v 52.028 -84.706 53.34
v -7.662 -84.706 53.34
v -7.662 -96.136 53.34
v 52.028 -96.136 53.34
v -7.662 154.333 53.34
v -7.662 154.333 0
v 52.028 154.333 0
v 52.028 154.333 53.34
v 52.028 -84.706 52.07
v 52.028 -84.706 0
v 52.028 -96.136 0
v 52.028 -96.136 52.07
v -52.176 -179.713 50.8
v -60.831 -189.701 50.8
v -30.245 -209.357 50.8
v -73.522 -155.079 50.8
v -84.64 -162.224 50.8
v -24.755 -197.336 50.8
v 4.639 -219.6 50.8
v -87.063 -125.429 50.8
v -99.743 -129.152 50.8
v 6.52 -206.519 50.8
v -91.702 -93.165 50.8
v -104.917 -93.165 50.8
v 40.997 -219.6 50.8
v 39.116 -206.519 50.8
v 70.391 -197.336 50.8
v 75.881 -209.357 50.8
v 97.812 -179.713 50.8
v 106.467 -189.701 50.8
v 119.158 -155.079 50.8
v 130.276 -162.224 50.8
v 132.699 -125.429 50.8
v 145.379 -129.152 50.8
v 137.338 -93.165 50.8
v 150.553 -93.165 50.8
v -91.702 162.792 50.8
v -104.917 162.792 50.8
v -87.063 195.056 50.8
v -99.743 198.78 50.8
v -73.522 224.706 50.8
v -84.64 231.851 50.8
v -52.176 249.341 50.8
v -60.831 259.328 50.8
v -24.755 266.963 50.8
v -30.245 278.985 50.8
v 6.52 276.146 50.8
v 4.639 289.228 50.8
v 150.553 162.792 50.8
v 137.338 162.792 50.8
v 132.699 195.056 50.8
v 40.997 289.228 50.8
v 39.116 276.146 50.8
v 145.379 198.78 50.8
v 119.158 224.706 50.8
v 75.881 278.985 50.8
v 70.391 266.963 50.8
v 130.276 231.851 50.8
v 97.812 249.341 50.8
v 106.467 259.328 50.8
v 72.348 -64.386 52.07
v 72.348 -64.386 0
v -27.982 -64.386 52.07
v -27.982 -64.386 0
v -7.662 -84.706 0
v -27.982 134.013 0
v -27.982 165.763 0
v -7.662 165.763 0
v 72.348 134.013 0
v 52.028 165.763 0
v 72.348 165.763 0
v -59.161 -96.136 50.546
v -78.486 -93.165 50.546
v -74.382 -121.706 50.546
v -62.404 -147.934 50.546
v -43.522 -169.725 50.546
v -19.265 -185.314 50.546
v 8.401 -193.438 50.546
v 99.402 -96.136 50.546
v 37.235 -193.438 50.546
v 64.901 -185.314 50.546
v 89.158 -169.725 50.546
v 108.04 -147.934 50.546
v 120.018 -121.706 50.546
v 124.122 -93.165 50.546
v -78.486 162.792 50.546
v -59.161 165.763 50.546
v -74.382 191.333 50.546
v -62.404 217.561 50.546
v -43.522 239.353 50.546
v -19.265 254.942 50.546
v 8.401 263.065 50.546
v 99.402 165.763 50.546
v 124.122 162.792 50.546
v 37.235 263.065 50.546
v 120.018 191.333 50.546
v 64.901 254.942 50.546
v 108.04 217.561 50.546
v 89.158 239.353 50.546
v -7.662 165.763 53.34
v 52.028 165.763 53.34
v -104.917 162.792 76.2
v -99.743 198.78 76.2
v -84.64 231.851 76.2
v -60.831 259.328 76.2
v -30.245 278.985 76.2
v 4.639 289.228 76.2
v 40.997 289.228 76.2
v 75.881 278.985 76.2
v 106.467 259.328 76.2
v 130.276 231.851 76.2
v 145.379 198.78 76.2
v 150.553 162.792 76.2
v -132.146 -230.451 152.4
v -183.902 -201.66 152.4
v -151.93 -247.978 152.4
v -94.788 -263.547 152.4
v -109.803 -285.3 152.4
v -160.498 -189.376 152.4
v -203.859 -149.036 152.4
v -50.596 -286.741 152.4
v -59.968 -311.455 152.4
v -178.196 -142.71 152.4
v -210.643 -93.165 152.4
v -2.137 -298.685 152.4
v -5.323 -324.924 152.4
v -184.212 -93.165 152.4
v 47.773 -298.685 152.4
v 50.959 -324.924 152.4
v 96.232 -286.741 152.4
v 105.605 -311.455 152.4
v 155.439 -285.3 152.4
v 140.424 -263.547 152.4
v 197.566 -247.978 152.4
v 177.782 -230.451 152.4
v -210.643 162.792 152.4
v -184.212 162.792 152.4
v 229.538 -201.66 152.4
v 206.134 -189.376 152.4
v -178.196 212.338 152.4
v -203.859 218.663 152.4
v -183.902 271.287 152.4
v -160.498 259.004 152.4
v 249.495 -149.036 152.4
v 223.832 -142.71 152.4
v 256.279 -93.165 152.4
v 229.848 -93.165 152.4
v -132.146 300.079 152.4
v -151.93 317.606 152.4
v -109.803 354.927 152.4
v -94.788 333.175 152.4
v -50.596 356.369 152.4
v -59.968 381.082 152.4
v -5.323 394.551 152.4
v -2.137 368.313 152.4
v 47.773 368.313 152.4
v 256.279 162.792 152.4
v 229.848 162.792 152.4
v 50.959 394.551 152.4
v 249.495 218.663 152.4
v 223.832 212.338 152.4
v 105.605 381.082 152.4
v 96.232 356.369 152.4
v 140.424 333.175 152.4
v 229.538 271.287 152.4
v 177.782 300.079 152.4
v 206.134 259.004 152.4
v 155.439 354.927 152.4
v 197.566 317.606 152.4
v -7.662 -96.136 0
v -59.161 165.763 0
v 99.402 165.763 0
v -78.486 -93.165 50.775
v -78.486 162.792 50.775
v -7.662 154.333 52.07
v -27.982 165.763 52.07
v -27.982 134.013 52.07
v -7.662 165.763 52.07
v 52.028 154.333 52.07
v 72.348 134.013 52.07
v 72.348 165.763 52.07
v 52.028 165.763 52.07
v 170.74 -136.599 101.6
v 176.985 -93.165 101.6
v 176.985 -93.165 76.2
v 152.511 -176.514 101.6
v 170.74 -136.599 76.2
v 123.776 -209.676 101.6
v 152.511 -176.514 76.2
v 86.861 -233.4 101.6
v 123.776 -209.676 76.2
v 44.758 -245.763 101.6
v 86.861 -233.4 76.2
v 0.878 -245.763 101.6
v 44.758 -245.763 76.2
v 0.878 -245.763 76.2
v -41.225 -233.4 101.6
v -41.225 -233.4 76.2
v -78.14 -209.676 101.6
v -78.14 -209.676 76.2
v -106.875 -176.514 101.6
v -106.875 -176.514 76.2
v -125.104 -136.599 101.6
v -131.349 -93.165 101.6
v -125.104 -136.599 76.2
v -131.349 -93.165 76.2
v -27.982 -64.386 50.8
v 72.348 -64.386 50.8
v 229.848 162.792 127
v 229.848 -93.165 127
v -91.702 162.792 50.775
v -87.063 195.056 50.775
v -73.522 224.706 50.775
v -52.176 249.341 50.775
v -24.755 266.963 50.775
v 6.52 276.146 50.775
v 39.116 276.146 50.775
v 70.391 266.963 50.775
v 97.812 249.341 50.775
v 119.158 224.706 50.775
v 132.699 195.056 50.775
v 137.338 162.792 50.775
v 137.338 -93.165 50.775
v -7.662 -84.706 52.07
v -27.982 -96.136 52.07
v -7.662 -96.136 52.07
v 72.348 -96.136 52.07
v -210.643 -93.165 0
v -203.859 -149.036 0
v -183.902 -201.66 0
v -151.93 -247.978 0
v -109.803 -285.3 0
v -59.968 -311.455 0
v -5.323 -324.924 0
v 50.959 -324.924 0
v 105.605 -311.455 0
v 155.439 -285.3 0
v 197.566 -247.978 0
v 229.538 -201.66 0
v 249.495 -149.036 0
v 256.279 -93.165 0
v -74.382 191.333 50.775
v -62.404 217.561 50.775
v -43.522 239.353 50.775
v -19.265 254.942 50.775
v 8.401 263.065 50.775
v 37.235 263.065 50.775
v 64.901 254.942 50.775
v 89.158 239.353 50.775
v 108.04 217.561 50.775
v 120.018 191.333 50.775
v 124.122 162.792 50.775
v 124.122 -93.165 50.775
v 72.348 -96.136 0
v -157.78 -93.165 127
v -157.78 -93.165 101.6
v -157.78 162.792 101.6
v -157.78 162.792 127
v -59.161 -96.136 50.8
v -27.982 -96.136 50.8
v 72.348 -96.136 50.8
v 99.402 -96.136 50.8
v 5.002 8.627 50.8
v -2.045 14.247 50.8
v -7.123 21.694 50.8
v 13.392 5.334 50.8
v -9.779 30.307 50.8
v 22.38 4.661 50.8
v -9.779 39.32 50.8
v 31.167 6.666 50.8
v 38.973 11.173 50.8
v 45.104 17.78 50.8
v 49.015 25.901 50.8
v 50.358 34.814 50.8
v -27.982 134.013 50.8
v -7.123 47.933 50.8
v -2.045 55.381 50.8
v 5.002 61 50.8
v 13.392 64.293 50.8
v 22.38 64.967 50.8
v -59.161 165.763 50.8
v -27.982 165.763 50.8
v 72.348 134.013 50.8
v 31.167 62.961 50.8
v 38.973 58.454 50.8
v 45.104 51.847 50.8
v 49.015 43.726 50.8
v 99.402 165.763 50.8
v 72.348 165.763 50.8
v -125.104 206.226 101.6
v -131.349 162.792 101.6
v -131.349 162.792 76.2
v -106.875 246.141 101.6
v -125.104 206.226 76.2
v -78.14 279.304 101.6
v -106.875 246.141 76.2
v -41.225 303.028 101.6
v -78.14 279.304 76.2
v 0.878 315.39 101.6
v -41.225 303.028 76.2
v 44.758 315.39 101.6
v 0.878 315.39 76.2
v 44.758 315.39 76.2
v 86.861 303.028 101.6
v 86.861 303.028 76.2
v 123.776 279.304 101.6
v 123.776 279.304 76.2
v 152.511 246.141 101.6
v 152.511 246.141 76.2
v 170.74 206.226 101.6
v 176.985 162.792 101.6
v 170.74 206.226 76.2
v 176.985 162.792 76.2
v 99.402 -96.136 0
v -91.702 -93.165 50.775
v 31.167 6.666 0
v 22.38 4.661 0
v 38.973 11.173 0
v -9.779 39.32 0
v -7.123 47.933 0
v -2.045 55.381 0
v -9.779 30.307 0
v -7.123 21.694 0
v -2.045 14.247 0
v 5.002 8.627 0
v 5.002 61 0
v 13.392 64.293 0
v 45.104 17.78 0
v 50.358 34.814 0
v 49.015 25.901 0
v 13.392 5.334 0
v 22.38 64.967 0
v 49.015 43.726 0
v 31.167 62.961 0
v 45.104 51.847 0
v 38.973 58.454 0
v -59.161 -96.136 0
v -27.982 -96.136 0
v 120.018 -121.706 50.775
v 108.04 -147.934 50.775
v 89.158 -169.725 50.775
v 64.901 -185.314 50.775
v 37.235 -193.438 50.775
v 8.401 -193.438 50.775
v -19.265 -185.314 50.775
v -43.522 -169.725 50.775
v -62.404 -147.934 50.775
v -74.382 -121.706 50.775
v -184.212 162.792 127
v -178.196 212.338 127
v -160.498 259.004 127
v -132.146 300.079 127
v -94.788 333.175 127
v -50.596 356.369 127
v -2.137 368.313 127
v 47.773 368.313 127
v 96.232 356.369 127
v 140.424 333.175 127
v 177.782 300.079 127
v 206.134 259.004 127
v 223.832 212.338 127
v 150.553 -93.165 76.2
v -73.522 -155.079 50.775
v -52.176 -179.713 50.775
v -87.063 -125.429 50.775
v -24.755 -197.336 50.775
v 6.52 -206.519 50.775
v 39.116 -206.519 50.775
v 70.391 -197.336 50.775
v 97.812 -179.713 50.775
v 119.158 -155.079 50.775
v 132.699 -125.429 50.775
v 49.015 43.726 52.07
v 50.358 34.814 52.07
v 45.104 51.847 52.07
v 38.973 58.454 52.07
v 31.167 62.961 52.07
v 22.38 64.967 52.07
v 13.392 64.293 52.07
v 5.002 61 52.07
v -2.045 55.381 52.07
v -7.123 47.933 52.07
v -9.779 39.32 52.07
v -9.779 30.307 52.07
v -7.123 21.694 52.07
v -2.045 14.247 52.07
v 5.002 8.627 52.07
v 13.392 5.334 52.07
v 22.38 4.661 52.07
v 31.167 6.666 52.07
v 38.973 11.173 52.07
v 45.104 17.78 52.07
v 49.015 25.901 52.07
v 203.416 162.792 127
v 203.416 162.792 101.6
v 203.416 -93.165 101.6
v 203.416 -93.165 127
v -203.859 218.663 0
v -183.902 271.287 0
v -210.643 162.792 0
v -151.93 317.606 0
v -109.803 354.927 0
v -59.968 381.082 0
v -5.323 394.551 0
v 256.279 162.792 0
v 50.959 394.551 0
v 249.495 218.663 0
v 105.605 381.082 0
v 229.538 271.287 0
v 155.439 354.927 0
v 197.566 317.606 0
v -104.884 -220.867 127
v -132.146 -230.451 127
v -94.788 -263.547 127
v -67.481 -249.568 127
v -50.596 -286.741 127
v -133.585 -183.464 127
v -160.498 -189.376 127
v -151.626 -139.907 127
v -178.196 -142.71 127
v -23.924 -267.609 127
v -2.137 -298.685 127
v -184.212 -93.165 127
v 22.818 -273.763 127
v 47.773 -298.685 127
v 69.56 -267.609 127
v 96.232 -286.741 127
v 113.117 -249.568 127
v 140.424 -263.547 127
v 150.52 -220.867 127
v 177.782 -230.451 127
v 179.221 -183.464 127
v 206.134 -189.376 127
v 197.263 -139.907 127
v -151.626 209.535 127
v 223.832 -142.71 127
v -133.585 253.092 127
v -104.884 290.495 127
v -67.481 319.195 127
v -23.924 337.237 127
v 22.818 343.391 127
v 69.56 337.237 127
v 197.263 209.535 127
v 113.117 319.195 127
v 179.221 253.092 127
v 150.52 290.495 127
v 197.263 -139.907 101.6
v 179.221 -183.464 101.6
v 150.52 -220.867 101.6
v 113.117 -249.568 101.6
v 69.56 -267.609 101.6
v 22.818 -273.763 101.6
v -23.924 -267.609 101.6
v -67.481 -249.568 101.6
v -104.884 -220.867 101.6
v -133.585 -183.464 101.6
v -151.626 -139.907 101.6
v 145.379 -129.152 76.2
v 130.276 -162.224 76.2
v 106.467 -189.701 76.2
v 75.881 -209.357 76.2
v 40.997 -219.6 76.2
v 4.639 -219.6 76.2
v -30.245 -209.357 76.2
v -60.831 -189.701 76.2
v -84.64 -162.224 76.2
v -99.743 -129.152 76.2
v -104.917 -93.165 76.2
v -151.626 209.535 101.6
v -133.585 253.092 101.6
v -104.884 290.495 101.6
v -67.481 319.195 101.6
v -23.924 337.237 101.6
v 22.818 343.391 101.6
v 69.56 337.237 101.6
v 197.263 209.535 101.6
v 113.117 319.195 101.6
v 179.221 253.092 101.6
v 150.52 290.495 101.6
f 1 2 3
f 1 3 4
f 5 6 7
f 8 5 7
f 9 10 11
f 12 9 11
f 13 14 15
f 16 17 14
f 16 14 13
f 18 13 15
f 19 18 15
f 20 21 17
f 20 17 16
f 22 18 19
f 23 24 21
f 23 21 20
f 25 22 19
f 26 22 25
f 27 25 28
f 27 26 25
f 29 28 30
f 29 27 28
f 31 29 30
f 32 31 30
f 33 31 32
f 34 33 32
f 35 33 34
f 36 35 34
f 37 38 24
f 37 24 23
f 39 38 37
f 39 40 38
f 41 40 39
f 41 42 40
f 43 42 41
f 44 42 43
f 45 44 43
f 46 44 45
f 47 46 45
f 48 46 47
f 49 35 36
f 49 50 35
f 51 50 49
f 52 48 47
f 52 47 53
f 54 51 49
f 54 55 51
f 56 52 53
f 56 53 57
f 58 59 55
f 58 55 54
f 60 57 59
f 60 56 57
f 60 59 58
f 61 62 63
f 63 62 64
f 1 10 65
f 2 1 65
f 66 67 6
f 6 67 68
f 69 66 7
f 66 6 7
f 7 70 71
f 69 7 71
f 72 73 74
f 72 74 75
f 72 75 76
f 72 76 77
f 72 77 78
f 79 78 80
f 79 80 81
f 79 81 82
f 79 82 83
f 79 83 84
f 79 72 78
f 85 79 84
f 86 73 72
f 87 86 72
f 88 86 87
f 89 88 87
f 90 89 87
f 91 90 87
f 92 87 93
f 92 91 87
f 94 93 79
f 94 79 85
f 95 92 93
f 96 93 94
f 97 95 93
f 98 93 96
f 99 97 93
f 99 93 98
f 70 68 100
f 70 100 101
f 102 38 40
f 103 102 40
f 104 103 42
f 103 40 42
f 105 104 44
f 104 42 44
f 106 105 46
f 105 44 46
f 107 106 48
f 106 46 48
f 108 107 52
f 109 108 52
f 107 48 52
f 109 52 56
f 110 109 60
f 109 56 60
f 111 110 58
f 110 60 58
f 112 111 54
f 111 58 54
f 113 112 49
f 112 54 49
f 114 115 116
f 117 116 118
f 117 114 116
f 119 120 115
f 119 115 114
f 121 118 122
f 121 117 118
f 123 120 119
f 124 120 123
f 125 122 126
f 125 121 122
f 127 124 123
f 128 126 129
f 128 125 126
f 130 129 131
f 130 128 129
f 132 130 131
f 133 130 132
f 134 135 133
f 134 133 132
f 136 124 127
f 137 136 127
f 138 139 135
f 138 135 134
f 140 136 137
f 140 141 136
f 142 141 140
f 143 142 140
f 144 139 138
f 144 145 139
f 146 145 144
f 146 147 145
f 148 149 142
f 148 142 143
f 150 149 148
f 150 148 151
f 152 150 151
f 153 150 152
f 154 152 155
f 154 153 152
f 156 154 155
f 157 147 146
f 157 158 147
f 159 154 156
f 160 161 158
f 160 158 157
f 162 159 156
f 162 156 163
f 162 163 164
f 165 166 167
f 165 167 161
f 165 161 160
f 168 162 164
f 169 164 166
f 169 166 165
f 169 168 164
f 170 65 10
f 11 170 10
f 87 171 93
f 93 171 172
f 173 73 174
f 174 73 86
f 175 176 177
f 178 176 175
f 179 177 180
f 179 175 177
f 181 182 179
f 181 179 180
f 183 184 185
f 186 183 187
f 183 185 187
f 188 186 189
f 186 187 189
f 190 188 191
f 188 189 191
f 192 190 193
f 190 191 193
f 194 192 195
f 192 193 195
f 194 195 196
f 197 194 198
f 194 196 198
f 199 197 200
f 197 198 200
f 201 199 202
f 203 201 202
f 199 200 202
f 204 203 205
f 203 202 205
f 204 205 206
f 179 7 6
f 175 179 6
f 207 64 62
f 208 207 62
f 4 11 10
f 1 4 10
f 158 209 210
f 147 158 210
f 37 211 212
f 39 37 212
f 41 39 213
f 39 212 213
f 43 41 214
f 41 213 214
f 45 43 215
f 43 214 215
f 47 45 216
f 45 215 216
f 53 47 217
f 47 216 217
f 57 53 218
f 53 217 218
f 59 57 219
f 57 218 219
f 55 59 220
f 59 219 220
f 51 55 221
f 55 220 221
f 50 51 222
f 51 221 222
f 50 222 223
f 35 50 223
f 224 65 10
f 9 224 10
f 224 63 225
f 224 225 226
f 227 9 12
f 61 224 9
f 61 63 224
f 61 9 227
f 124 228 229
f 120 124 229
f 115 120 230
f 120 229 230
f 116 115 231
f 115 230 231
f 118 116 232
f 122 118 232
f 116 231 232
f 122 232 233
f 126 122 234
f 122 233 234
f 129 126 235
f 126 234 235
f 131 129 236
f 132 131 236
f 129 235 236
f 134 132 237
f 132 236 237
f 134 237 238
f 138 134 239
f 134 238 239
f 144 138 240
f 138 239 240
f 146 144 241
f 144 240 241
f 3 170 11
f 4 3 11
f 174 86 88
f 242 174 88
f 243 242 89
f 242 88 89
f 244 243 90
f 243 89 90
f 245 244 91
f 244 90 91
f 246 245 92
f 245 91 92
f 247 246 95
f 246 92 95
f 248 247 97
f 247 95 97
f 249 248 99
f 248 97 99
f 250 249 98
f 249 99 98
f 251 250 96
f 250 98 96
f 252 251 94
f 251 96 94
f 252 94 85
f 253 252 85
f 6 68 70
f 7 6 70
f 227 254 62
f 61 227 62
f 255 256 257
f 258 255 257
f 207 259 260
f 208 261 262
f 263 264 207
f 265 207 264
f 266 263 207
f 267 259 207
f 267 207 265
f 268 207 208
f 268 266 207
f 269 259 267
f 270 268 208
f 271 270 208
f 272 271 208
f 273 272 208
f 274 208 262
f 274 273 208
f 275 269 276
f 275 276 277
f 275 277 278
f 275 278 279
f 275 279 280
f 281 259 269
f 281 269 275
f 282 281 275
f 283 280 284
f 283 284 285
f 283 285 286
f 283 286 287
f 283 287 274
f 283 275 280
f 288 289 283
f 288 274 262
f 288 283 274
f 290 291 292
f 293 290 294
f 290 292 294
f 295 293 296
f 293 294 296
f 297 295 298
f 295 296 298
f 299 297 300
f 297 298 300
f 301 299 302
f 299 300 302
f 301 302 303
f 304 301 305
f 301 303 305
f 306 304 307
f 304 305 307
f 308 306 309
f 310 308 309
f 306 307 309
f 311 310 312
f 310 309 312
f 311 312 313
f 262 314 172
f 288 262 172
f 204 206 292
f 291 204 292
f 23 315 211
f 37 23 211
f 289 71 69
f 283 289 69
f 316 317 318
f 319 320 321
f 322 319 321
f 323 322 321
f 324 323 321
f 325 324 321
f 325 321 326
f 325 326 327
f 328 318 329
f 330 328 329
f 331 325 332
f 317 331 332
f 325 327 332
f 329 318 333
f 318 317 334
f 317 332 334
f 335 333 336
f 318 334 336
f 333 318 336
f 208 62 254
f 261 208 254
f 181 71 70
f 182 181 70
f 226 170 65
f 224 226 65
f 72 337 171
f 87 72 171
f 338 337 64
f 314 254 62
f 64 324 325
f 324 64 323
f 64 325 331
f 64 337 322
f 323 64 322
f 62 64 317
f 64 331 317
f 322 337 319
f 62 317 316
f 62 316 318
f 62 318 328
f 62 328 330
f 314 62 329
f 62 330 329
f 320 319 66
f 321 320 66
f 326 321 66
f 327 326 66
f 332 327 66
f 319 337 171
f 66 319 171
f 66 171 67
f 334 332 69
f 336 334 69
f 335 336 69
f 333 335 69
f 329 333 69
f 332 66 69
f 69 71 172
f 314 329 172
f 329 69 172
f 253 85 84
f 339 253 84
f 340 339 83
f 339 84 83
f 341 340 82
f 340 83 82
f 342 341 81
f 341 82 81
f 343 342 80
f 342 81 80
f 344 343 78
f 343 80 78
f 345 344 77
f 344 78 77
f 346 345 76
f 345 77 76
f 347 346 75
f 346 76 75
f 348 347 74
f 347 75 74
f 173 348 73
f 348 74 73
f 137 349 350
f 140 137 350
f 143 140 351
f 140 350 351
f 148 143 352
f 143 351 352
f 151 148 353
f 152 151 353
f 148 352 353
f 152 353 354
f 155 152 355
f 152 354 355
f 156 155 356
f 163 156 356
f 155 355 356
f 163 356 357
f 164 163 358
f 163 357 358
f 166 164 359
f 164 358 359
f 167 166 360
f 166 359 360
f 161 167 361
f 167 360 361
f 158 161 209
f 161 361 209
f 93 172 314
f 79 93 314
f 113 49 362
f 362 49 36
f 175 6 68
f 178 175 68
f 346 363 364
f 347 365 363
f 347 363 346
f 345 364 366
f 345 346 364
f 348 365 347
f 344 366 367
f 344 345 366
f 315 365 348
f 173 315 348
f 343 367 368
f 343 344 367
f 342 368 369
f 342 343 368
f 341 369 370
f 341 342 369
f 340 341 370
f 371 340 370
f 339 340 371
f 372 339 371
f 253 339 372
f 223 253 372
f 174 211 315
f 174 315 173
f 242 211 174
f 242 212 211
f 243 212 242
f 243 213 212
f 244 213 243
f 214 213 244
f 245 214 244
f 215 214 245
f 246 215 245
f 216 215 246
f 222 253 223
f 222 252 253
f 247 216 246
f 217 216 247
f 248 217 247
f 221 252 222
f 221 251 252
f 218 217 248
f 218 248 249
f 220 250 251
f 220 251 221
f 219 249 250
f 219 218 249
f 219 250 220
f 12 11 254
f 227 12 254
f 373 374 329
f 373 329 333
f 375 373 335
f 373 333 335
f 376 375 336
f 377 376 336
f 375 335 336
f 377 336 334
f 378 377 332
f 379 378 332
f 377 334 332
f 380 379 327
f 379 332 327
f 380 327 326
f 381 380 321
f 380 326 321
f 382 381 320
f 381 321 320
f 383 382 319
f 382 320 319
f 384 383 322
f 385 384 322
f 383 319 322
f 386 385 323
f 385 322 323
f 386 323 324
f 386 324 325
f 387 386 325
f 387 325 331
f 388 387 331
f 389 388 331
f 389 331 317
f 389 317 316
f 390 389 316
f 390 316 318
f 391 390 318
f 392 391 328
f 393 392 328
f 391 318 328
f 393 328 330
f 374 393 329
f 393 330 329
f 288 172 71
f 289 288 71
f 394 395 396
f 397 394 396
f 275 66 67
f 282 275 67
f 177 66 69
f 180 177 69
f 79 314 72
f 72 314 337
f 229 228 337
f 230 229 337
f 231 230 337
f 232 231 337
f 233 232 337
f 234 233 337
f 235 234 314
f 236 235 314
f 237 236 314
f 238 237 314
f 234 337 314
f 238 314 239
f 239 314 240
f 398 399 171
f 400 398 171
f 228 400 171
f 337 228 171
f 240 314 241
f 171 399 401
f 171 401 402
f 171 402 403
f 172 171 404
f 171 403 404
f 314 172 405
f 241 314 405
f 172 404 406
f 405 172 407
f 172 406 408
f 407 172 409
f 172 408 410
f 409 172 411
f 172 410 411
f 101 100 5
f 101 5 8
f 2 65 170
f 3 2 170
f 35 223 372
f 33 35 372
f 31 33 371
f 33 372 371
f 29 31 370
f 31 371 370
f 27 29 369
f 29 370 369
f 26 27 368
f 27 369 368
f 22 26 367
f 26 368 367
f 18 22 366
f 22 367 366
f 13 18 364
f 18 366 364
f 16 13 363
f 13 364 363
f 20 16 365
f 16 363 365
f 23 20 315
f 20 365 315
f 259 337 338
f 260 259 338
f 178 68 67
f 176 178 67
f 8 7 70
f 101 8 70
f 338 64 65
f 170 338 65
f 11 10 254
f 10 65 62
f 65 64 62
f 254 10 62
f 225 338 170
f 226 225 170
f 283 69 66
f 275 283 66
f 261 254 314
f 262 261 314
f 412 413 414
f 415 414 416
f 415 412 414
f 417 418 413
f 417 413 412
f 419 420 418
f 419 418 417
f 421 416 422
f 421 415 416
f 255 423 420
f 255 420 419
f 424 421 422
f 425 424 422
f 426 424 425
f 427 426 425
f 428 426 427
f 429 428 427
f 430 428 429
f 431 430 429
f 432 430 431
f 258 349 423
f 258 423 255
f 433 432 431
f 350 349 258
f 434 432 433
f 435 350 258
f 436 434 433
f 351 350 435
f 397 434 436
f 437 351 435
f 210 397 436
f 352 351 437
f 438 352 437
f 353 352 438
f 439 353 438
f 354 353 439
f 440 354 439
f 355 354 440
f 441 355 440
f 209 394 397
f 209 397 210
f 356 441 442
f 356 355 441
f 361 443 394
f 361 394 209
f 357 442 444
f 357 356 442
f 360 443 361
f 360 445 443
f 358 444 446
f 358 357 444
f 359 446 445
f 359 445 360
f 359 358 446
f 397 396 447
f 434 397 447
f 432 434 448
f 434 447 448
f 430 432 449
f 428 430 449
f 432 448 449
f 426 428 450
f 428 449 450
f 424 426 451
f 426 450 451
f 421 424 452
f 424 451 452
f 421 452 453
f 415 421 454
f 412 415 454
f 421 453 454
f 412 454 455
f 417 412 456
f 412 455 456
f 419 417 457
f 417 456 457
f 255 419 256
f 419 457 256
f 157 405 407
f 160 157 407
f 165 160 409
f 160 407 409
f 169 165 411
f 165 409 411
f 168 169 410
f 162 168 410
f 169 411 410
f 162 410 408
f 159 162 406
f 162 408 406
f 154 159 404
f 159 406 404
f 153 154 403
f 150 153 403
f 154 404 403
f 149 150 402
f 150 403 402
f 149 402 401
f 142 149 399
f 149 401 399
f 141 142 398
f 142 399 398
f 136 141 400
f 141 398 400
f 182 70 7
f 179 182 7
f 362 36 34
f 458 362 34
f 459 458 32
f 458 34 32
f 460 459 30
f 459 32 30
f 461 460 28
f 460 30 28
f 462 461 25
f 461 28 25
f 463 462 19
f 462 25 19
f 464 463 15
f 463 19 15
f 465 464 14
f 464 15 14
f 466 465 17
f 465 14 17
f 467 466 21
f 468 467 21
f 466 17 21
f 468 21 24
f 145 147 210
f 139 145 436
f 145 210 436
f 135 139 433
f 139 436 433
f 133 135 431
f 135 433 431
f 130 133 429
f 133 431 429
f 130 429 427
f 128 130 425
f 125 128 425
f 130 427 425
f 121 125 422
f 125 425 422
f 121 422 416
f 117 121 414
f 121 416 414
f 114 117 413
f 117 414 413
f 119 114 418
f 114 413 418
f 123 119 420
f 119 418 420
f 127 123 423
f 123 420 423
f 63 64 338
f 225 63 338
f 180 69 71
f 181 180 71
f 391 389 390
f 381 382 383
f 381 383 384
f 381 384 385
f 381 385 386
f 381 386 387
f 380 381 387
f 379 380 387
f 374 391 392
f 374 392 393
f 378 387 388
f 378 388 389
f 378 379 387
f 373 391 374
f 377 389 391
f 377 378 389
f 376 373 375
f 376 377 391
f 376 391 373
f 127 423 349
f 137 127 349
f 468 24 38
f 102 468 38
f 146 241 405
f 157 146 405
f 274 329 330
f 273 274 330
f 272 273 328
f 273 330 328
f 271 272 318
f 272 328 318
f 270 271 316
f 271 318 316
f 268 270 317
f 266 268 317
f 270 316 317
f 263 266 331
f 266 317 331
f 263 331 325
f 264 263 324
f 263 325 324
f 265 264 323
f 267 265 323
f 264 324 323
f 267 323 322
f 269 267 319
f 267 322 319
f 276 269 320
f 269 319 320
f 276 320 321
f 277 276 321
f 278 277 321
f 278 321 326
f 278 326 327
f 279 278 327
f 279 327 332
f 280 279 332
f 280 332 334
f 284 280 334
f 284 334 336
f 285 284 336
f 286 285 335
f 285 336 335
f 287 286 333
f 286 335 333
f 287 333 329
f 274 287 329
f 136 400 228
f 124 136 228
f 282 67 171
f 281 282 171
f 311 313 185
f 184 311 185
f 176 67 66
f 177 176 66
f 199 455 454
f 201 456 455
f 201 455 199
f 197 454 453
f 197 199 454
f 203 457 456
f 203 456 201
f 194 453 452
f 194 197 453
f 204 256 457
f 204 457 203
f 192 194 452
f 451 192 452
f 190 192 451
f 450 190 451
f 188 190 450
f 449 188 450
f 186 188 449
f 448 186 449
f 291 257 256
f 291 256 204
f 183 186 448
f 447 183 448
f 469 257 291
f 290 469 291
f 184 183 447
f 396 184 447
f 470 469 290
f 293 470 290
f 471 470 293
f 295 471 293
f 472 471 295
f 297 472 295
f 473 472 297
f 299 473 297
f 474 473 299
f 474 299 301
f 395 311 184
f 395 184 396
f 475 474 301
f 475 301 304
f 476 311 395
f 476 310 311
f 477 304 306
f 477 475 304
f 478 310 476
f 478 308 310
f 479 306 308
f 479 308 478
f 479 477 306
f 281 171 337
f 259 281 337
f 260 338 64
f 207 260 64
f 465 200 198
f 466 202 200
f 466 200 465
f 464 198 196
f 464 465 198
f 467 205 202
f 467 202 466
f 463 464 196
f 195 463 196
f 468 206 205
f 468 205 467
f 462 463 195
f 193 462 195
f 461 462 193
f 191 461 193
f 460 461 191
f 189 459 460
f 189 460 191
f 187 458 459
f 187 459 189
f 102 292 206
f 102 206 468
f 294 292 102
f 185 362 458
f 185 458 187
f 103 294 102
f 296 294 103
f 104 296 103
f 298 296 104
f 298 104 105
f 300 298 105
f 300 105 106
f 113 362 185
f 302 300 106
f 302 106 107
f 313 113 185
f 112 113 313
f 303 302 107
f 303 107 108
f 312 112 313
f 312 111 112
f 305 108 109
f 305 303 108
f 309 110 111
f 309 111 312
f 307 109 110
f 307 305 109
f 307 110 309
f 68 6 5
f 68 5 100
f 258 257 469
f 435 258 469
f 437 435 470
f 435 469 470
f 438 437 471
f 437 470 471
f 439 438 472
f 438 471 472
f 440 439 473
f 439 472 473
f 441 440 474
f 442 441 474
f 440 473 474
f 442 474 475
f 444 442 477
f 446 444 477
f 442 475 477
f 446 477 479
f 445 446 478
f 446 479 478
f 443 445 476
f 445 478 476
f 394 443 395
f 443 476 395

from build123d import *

# Parameters (mm, degrees)
F0_W      = 59.6899963813
F0_H      = 11.43
F1_DEPTH  = 53.34
F2_DEPTH  = 52.07
F3_DEPTH  = 50.8
F4_DEPTH  = 50.546
F5_DEPTH  = 50.7746
F6_DEPTH  = 50.799746
F7_DEPTH  = 76.2
F8_DEPTH  = 101.6
F9_DEPTH  = 127
F10_DEPTH = 152.4


with BuildPart() as f1:
    # F0 (on Top) → F1 (new body)
    with BuildSketch(Plane.XY):
        with Locations((22.1830820161, 160.0484472161)):
            Rectangle(F0_W, F0_H)
    extrude(amount=F1_DEPTH)


with BuildPart() as f1b:
    # F0 (on Top) → F1, piece 2 (new body)
    with BuildSketch(Plane.XY):
        Polygon((-7.6619161746, -84.705963729), (-7.6619161746, -96.135963729), (22.8180838254, -96.135963729), (52.0280802068, -96.135963729), (52.0280802068, -94.8659601103), (52.0280802068, -84.705963729), align=None)
    extrude(amount=F1_DEPTH)


with BuildPart() as f2:
    # F0 (on Top) → F2 (new body)
    with BuildSketch(Plane.XY):
        Polygon((-27.9819161746, -64.385963729), (-27.9819161746, -96.135963729), (-7.6619161746, -96.135963729), (-7.6619161746, -84.705963729), (52.0280802068, -84.705963729), (52.0280802068, -94.8659601103), (52.0280802068, -96.135963729), (67.8483322263, -96.135963729), (72.3480802068, -96.135963729), (72.3480802068, -64.385963729), align=None)
    extrude(amount=F2_DEPTH)


with BuildPart() as f2b:
    # F0 (on Top) → F2, piece 2 (new body)
    with BuildSketch(Plane.XY):
        Polygon((-7.6619161746, 165.7634472161), (-27.9819161746, 165.7634472161), (-27.9819161746, 134.0134472161), (72.3480802068, 134.0134472161), (72.3480802068, 165.7634472161), (52.0280802068, 165.7634472161), (52.0280802068, 154.3334472161), (-7.6619161746, 154.3334472161), align=None)
    extrude(amount=F2_DEPTH)


with BuildPart() as f2c:
    # F0 (on Top) → F2, piece 3 (new body)
    with BuildSketch(Plane.XY):
        with BuildLine():
            Line((50.3579524463, 34.8137417436), (-10.1172057288, 34.8137417436))
            ThreePointArc((-10.1172057288, 34.8137417436), (20.1203733588, 4.576162656), (50.3579524463, 34.8137417436))
        make_face()
        with BuildLine():
            ThreePointArc((50.3579524463, 34.8137417436), (20.1203733588, 65.0513208311), (-10.1172057288, 34.8137417436))
            Line((-10.1172057288, 34.8137417436), (50.3579524463, 34.8137417436))
        make_face()
    extrude(amount=F2_DEPTH)


with BuildPart() as f3:
    # F0 (on Top) → F3 (new body)
    with BuildSketch(Plane.XY):
        with BuildLine():
            Line((-27.9819161746, 165.7634472161), (-59.1609889327, 165.7634472161))
            Line((-59.1609889327, 165.7634472161), (-59.1609889327, 34.8137417436))
            Line((-59.1609889327, 34.8137417436), (-10.1172057288, 34.8137417436))
            ThreePointArc((-10.1172057288, 34.8137417436), (20.1203733588, 65.0513208311), (50.3579524463, 34.8137417436))
            Line((50.3579524463, 34.8137417436), (99.4017356502, 34.8137417436))
            Line((99.4017356502, 34.8137417436), (99.4017356502, 165.7634472161))
            Line((99.4017356502, 165.7634472161), (72.3480802068, 165.7634472161))
            Line((72.3480802068, 165.7634472161), (72.3480802068, 134.0134472161))
            Line((72.3480802068, 134.0134472161), (-27.9819161746, 134.0134472161))
            Line((-27.9819161746, 134.0134472161), (-27.9819161746, 165.7634472161))
        make_face()
        with BuildLine():
            Line((-10.1172057288, 34.8137417436), (-59.1609889327, 34.8137417436))
            Line((-59.1609889327, 34.8137417436), (-59.1609889327, -96.135963729))
            Line((-59.1609889327, -96.135963729), (-27.9819161746, -96.135963729))
            Line((-27.9819161746, -96.135963729), (-27.9819161746, -64.385963729))
            Line((-27.9819161746, -64.385963729), (72.3480802068, -64.385963729))
            Line((72.3480802068, -64.385963729), (72.3480802068, -96.135963729))
            Line((72.3480802068, -96.135963729), (99.4017356502, -96.135963729))
            Line((99.4017356502, -96.135963729), (99.4017356502, 34.8137417436))
            Line((99.4017356502, 34.8137417436), (50.3579524463, 34.8137417436))
            ThreePointArc((50.3579524463, 34.8137417436), (20.1203733588, 4.576162656), (-10.1172057288, 34.8137417436))
        make_face()
    extrude(amount=F3_DEPTH)


with BuildPart() as f4:
    # F0 (on Top) → F4 (new body)
    with BuildSketch(Plane.XY):
        with BuildLine():
            Line((124.1219758281, -93.1649838208), (124.1219758281, 162.7924673079))
            ThreePointArc((124.1219758281, 162.7924673079), (22.8180838254, 264.0963593106), (-78.4858081773, 162.7924673079))
            Line((-78.4858081773, 162.7924673079), (-78.4858081773, -93.1649838208))
            ThreePointArc((-78.4858081773, -93.1649838208), (22.8180838254, -194.4688758235), (124.1219758281, -93.1649838208))
        make_face()
        Polygon((-59.1609889327, 34.8137417436), (-59.1609889327, 165.7634472161), (-27.9819161746, 165.7634472161), (-7.6619161746, 165.7634472161), (52.0280802068, 165.7634472161), (72.3480802068, 165.7634472161), (99.4017356502, 165.7634472161), (99.4017356502, 34.8137417436), (99.4017356502, -96.135963729), (72.3480802068, -96.135963729), (67.8483322263, -96.135963729), (52.0280802068, -96.135963729), (22.8180838254, -96.135963729), (-7.6619161746, -96.135963729), (-27.9819161746, -96.135963729), (-59.1609889327, -96.135963729), align=None, mode=Mode.SUBTRACT)
    extrude(amount=F4_DEPTH)

    # F0 (on Top) → F5 (join)
    with BuildSketch(Plane.XY):
        with BuildLine():
            Line((137.3377131925, -93.1649838208), (137.3377131925, 162.7924673079))
            ThreePointArc((137.3377131925, 162.7924673079), (22.8180838254, 277.312096675), (-91.7015455416, 162.7924673079))
            Line((-91.7015455416, 162.7924673079), (-91.7015455416, -93.1649838208))
            ThreePointArc((-91.7015455416, -93.1649838208), (22.8180838254, -207.6846131878), (137.3377131925, -93.1649838208))
        make_face()
        with BuildLine():
            ThreePointArc((-78.4858081773, 162.7924673079), (22.8180838254, 264.0963593106), (124.1219758281, 162.7924673079))
            Line((124.1219758281, 162.7924673079), (124.1219758281, -93.1649838208))
            ThreePointArc((124.1219758281, -93.1649838208), (22.8180838254, -194.4688758235), (-78.4858081773, -93.1649838208))
            Line((-78.4858081773, -93.1649838208), (-78.4858081773, 162.7924673079))
        make_face(mode=Mode.SUBTRACT)
    extrude(amount=F5_DEPTH)

    # F0 (on Top) → F6 (join)
    with BuildSketch(Plane.XY):
        with BuildLine():
            Line((150.5534294362, -93.1649838208), (150.5534294362, 162.7924673079))
            ThreePointArc((150.5534294362, 162.7924673079), (22.8180838254, 290.5278129187), (-104.9172617853, 162.7924673079))
            Line((-104.9172617853, 162.7924673079), (-104.9172617853, -93.1649838208))
            ThreePointArc((-104.9172617853, -93.1649838208), (22.8180838254, -220.9003294315), (150.5534294362, -93.1649838208))
        make_face()
        with BuildLine():
            ThreePointArc((-91.7015455416, 162.7924673079), (22.8180838254, 277.312096675), (137.3377131925, 162.7924673079))
            Line((137.3377131925, 162.7924673079), (137.3377131925, -93.1649838208))
            ThreePointArc((137.3377131925, -93.1649838208), (22.8180838254, -207.6846131878), (-91.7015455416, -93.1649838208))
            Line((-91.7015455416, -93.1649838208), (-91.7015455416, 162.7924673079))
        make_face(mode=Mode.SUBTRACT)
    extrude(amount=F6_DEPTH)

    # F0 (on Top) → F7 (join)
    with BuildSketch(Plane.XY):
        with BuildLine():
            Line((176.9848796875, -93.1649838208), (176.9848796875, 162.7924673079))
            ThreePointArc((176.9848796875, 162.7924673079), (22.8180838254, 316.95926317), (-131.3487120367, 162.7924673079))
            Line((-131.3487120367, 162.7924673079), (-131.3487120367, -93.1649838208))
            ThreePointArc((-131.3487120367, -93.1649838208), (22.8180838254, -247.3317796829), (176.9848796875, -93.1649838208))
        make_face()
        with BuildLine():
            ThreePointArc((-104.9172617853, 162.7924673079), (22.8180838254, 290.5278129187), (150.5534294362, 162.7924673079))
            Line((150.5534294362, 162.7924673079), (150.5534294362, -93.1649838208))
            ThreePointArc((150.5534294362, -93.1649838208), (22.8180838254, -220.9003294315), (-104.9172617853, -93.1649838208))
            Line((-104.9172617853, -93.1649838208), (-104.9172617853, 162.7924673079))
        make_face(mode=Mode.SUBTRACT)
    extrude(amount=F7_DEPTH)

    # F0 (on Top) → F8 (join)
    with BuildSketch(Plane.XY):
        with BuildLine():
            Line((203.4163299388, -93.1649838208), (203.4163299388, 162.7924673079))
            ThreePointArc((203.4163299388, 162.7924673079), (22.8180838254, 343.3907134213), (-157.780162288, 162.7924673079))
            Line((-157.780162288, 162.7924673079), (-157.780162288, -93.1649838208))
            ThreePointArc((-157.780162288, -93.1649838208), (22.8180838254, -273.7632299342), (203.4163299388, -93.1649838208))
        make_face()
        with BuildLine():
            ThreePointArc((-131.3487120367, 162.7924673079), (22.8180838254, 316.95926317), (176.9848796875, 162.7924673079))
            Line((176.9848796875, 162.7924673079), (176.9848796875, -93.1649838208))
            ThreePointArc((176.9848796875, -93.1649838208), (22.8180838254, -247.3317796829), (-131.3487120367, -93.1649838208))
            Line((-131.3487120367, -93.1649838208), (-131.3487120367, 162.7924673079))
        make_face(mode=Mode.SUBTRACT)
    extrude(amount=F8_DEPTH)

    # F0 (on Top) → F9 (join)
    with BuildSketch(Plane.XY):
        with BuildLine():
            Line((229.8477889233, -93.1649838208), (229.8477889233, 162.7924673079))
            ThreePointArc((229.8477889233, 162.7924673079), (22.8180838254, 369.8221724058), (-184.2116212725, 162.7924673079))
            Line((-184.2116212725, 162.7924673079), (-184.2116212725, -93.1649838208))
            ThreePointArc((-184.2116212725, -93.1649838208), (22.8180838254, -300.1946889187), (229.8477889233, -93.1649838208))
        make_face()
        with BuildLine():
            ThreePointArc((-157.780162288, 162.7924673079), (22.8180838254, 343.3907134213), (203.4163299388, 162.7924673079))
            Line((203.4163299388, 162.7924673079), (203.4163299388, -93.1649838208))
            ThreePointArc((203.4163299388, -93.1649838208), (22.8180838254, -273.7632299342), (-157.780162288, -93.1649838208))
            Line((-157.780162288, -93.1649838208), (-157.780162288, 162.7924673079))
        make_face(mode=Mode.SUBTRACT)
    extrude(amount=F9_DEPTH)

    # F0 (on Top) → F10 (join)
    with BuildSketch(Plane.XY):
        with BuildLine():
            Line((256.2792391746, -93.1649838208), (256.2792391746, 162.7924673079))
            ThreePointArc((256.2792391746, 162.7924673079), (22.8180838254, 396.2536226571), (-210.6430715238, 162.7924673079))
            Line((-210.6430715238, 162.7924673079), (-210.6430715238, -93.1649838208))
            ThreePointArc((-210.6430715238, -93.1649838208), (22.8180838254, -326.62613917), (256.2792391746, -93.1649838208))
        make_face()
        with BuildLine():
            ThreePointArc((-184.2116212725, 162.7924673079), (22.8180838254, 369.8221724058), (229.8477889233, 162.7924673079))
            Line((229.8477889233, 162.7924673079), (229.8477889233, -93.1649838208))
            ThreePointArc((229.8477889233, -93.1649838208), (22.8180838254, -300.1946889187), (-184.2116212725, -93.1649838208))
            Line((-184.2116212725, -93.1649838208), (-184.2116212725, 162.7924673079))
        make_face(mode=Mode.SUBTRACT)
    extrude(amount=F10_DEPTH)


solid = Compound([f1.part, f1b.part, f2.part, f2b.part, f2c.part, f3.part, f4.part])
